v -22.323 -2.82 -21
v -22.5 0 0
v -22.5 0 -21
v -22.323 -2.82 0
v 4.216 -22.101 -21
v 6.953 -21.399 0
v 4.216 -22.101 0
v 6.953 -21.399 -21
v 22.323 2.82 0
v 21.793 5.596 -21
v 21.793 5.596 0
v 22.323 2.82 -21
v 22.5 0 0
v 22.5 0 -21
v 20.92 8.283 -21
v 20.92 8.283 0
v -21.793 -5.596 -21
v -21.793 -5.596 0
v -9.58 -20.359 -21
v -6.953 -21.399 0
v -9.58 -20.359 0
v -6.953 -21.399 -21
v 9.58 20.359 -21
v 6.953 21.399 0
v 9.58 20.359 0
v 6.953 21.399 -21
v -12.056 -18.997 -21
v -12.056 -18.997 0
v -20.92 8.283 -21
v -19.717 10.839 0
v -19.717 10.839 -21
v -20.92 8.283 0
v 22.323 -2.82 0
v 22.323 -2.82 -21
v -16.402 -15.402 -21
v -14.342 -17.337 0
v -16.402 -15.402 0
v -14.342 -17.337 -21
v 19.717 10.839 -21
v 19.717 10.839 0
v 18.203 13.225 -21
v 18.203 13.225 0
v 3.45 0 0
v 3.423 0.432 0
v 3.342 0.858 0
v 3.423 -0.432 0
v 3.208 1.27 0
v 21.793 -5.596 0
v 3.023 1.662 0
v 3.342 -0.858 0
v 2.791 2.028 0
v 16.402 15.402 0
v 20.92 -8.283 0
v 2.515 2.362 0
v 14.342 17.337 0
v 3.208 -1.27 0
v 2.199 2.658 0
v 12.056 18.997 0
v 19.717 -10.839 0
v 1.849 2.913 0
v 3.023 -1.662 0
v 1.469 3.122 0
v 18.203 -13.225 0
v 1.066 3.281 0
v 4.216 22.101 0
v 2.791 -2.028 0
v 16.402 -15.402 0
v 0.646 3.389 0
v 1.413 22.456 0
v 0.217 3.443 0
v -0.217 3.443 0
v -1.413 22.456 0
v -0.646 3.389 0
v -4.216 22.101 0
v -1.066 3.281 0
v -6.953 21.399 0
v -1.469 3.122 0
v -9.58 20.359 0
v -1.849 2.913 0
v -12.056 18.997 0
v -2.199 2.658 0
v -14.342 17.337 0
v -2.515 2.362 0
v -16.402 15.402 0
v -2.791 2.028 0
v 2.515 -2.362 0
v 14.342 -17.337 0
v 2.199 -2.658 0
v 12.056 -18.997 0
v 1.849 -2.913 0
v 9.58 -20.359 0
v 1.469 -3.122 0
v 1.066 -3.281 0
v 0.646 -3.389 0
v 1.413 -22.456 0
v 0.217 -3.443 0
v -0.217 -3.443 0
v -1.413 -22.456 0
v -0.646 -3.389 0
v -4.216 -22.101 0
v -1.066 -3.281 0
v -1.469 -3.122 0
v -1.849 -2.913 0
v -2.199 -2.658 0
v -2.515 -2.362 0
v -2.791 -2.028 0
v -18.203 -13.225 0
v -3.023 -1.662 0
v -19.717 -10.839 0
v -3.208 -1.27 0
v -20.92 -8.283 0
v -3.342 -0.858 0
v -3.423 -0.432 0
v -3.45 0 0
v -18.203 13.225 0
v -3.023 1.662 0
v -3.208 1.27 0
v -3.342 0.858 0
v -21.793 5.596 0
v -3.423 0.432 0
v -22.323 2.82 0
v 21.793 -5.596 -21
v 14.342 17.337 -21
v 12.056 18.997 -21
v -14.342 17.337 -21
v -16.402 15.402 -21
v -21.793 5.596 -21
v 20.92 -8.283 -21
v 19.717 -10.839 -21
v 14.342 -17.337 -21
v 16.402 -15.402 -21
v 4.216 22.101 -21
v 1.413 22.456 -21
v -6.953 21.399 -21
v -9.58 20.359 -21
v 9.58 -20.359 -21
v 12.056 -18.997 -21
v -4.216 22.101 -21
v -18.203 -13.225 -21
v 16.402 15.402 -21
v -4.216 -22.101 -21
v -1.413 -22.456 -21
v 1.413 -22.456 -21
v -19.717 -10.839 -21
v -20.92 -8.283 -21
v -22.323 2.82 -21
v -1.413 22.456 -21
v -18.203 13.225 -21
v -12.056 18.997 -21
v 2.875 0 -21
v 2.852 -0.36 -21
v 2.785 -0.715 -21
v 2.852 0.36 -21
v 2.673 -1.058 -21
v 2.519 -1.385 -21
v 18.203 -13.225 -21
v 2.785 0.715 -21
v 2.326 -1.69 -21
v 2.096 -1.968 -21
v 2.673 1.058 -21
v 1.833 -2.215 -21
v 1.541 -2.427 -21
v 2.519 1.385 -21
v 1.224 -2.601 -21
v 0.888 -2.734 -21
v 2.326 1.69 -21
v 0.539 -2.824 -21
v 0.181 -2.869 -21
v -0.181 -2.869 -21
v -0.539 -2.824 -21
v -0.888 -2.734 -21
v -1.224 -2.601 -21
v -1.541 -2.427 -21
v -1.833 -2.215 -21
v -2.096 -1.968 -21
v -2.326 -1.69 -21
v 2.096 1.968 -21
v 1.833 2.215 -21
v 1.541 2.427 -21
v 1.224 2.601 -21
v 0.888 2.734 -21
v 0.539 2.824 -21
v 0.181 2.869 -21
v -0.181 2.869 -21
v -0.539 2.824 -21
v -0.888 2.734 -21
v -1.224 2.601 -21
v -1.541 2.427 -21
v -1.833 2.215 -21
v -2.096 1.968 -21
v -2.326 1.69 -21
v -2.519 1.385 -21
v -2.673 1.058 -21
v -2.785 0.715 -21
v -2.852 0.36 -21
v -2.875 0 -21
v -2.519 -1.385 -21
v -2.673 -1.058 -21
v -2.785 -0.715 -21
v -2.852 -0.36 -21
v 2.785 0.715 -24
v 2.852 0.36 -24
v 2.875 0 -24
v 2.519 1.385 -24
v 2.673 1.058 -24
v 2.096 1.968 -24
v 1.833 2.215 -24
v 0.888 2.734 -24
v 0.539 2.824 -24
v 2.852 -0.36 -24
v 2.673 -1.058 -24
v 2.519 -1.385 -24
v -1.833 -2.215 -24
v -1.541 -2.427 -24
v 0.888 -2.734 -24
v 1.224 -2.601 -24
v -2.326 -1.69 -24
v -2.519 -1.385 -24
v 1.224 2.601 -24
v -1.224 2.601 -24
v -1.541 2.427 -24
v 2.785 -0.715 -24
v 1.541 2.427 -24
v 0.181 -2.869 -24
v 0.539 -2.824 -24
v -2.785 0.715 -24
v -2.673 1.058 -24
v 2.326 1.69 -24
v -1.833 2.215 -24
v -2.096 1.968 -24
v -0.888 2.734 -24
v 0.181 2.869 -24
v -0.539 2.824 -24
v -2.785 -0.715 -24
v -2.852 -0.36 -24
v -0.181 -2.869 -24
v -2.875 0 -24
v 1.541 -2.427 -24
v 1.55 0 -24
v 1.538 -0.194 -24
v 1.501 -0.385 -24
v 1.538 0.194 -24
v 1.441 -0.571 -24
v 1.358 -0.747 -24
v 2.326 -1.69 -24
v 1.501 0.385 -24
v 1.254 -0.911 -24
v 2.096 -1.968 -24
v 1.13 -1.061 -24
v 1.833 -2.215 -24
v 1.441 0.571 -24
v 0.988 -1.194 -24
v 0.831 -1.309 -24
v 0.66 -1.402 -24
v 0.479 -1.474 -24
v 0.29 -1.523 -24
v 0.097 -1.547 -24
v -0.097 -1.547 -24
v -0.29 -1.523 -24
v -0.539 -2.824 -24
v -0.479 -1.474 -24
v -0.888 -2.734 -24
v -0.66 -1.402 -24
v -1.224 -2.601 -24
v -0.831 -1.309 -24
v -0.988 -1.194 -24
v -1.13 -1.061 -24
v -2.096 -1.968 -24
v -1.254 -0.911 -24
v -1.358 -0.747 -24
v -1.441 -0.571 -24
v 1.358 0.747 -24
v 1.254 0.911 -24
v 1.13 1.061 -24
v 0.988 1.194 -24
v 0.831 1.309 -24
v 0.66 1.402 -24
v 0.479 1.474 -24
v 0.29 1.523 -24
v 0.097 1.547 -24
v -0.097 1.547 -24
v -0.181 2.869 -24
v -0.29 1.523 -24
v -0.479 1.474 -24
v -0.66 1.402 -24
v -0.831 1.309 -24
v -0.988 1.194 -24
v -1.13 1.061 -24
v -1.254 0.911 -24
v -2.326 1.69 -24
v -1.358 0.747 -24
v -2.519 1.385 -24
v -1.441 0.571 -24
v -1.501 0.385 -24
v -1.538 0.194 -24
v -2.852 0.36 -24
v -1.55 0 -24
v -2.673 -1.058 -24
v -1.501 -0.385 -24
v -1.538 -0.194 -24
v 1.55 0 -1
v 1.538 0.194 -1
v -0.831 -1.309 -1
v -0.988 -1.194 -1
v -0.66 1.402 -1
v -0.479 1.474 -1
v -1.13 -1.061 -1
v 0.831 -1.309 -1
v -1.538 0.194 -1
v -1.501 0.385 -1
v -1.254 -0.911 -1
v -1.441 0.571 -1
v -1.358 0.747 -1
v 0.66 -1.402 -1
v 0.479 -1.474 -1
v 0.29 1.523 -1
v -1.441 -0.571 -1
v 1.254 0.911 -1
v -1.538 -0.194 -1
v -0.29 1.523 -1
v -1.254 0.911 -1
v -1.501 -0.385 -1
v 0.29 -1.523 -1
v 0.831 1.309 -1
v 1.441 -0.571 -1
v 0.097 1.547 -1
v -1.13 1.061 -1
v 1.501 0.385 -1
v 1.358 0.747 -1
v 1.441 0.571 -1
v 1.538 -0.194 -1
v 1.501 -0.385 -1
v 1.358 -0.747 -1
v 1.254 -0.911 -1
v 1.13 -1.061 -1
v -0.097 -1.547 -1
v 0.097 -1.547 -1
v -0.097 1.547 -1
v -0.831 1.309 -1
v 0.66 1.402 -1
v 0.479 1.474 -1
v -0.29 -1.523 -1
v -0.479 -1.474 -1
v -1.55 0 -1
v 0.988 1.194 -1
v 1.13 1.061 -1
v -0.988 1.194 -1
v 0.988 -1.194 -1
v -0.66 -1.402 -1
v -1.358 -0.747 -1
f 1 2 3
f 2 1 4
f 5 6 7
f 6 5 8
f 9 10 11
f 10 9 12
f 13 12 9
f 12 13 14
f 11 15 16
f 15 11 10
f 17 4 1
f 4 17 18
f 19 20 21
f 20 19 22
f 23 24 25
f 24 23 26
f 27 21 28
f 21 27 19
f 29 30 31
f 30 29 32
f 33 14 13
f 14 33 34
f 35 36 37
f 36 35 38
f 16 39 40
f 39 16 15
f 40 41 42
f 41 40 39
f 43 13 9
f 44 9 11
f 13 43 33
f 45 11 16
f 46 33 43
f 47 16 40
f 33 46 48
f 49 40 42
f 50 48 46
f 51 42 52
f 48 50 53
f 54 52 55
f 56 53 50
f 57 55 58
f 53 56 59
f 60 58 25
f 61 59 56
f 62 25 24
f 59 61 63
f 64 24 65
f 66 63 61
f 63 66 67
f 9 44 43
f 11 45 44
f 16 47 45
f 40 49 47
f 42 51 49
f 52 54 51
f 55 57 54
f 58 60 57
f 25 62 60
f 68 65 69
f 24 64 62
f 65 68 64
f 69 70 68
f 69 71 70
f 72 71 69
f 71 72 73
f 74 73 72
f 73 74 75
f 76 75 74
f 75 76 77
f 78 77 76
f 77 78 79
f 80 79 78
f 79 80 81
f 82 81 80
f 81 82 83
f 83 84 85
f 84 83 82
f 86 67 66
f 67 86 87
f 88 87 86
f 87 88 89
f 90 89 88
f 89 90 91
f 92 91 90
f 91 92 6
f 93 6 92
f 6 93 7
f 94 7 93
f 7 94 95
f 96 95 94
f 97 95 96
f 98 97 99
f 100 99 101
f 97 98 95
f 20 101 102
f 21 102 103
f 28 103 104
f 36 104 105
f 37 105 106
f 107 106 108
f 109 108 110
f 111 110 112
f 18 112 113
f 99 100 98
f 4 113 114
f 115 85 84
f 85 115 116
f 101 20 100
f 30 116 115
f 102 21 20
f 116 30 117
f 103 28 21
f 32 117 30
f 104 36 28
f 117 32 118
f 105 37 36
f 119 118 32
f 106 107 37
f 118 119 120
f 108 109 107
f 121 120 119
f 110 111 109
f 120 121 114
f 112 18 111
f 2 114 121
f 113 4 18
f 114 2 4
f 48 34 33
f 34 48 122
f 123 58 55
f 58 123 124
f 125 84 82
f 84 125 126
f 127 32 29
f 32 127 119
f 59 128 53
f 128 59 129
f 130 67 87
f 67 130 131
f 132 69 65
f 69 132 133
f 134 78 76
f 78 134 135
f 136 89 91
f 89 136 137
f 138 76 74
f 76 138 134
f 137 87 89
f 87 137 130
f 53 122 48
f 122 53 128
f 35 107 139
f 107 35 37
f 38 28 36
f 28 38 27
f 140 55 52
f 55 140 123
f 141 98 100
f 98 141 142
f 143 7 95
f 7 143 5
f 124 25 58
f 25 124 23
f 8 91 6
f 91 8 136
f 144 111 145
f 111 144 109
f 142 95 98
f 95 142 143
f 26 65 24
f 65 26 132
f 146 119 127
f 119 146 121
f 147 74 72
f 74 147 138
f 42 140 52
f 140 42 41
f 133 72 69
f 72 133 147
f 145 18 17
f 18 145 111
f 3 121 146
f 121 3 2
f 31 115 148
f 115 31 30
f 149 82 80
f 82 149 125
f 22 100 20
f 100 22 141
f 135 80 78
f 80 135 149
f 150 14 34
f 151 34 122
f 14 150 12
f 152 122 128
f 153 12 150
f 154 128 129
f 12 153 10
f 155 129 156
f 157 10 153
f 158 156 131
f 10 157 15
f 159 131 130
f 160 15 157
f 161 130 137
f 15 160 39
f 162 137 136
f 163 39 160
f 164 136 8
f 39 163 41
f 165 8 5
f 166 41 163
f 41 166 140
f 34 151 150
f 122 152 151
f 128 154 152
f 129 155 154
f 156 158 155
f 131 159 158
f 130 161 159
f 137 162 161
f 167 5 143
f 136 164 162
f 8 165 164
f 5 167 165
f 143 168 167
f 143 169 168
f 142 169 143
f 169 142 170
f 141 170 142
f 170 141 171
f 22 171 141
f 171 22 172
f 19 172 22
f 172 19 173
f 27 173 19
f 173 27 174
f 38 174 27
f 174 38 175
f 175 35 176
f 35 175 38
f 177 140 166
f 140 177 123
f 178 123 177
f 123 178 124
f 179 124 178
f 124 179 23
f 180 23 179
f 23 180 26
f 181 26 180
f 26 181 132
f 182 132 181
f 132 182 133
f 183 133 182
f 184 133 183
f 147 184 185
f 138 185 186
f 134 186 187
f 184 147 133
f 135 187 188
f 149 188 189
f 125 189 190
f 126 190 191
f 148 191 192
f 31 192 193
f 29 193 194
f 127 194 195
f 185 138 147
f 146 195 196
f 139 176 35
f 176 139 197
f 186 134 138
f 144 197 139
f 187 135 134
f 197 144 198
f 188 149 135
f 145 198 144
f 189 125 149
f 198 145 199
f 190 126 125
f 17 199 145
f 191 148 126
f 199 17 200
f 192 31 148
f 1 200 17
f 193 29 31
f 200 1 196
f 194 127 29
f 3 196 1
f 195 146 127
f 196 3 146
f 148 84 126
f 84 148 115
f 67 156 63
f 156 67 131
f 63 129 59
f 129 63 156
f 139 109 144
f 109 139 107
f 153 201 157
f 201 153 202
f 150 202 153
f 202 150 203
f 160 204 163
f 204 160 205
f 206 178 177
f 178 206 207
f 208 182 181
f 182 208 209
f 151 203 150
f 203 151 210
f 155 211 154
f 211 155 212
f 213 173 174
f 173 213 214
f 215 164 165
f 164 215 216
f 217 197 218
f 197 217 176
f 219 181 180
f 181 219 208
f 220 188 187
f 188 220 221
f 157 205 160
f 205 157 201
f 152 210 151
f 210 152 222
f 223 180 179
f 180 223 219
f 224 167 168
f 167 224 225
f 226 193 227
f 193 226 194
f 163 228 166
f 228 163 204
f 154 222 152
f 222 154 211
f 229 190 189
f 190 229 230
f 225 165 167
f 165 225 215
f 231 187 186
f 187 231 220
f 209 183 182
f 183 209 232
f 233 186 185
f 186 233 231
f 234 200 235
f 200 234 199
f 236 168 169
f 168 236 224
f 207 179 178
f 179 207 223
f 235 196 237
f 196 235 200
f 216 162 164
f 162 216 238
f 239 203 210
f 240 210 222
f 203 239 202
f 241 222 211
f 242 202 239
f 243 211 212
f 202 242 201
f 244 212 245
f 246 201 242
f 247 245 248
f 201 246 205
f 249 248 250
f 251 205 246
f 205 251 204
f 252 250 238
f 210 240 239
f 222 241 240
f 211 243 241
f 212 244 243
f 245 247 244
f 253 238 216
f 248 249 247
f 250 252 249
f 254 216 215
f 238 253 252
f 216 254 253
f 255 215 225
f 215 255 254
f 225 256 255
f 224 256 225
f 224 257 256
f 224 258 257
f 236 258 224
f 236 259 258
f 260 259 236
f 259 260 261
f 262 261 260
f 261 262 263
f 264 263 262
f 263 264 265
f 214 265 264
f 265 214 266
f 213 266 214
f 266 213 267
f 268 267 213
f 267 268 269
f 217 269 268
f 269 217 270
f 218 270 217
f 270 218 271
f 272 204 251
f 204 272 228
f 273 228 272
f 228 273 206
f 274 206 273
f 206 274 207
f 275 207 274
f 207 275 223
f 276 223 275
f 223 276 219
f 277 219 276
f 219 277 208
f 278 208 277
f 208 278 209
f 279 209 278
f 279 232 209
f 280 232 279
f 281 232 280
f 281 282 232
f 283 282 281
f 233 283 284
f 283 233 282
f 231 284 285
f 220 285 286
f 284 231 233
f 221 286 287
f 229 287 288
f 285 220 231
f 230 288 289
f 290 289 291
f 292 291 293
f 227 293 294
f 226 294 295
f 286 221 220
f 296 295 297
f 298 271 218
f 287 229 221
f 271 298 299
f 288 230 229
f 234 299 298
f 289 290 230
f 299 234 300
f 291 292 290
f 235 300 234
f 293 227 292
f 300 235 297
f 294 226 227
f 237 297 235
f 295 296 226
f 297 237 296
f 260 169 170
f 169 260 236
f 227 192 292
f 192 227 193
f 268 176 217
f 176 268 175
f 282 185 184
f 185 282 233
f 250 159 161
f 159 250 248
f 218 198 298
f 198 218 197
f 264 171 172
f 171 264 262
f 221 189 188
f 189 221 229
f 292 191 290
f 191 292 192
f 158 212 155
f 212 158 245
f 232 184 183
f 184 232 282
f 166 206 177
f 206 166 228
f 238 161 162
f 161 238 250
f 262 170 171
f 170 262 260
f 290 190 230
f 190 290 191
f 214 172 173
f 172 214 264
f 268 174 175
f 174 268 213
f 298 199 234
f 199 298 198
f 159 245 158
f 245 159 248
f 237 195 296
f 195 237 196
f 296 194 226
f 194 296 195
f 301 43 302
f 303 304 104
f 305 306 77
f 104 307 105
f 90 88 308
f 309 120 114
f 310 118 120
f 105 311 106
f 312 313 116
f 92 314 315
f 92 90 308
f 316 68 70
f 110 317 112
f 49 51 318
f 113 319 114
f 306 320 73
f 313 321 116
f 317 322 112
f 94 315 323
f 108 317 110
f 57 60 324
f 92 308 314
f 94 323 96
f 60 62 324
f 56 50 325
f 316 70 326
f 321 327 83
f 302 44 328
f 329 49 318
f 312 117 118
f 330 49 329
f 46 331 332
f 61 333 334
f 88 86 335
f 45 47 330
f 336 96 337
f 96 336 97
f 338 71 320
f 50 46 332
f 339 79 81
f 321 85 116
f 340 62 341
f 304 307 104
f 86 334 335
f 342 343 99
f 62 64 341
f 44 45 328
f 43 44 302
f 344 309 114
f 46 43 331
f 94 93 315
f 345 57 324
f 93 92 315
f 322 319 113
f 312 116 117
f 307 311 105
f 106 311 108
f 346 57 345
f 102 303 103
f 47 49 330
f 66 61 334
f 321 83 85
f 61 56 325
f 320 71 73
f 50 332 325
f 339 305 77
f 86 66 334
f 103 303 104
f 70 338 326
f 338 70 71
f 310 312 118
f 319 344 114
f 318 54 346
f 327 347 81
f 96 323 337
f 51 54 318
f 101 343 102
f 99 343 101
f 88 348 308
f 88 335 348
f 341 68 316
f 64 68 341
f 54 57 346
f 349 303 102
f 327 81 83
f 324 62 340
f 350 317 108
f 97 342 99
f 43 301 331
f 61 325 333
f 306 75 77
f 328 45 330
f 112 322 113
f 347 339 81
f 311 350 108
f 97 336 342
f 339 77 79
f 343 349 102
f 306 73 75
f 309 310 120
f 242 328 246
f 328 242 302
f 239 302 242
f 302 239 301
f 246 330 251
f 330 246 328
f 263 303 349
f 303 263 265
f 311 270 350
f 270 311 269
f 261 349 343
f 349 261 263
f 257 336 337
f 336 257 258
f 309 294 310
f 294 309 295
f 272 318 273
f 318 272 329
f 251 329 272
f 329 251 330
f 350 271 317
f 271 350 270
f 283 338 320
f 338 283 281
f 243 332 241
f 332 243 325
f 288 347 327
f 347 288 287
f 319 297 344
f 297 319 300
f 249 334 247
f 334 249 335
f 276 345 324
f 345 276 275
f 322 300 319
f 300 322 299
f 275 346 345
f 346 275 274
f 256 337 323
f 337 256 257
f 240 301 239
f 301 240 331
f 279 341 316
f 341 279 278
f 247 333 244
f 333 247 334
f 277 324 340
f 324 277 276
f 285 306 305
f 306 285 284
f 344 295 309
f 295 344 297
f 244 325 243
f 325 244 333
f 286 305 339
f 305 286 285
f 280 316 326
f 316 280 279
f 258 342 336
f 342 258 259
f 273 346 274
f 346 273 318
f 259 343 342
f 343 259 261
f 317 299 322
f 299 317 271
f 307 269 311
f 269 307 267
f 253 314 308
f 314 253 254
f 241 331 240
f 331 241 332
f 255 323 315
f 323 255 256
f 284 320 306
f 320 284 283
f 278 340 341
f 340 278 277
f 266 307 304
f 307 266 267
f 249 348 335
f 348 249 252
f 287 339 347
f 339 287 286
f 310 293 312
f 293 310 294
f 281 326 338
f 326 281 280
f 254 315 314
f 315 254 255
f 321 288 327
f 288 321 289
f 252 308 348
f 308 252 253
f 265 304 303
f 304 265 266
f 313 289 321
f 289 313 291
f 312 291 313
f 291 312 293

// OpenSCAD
$fn = 50;

difference() {
	union() {
		translate(v = [0, 0, -21.0]) {
			cylinder(h = 21, r = 22.5);
		}
		#translate(v = [0, 0, -24.0]) {
			cylinder(h = 24, r = 2.875);
		}
	}
	union() {
		translate(v = [0, 0, 0]) {
			rotate(a = [0, 0, 0]) {
				difference() {
					union() {
						translate(v = [0, 0, -24.0]) {
							cylinder(h = 24, r = 1.25);
						}
						translate(v = [0, 0, -1.0]) {
							cylinder(h = 1.0, r1 = 1.55, r2 = 3.45);
						}
						translate(v = [0, 0, -24.0]) {
							cylinder(h = 24, r = 1.55);
						}
						translate(v = [0, 0, -24.0]) {
							cylinder(h = 24, r = 1.25);
						}
					}
					union();
				}
			}
		}
	}
}
